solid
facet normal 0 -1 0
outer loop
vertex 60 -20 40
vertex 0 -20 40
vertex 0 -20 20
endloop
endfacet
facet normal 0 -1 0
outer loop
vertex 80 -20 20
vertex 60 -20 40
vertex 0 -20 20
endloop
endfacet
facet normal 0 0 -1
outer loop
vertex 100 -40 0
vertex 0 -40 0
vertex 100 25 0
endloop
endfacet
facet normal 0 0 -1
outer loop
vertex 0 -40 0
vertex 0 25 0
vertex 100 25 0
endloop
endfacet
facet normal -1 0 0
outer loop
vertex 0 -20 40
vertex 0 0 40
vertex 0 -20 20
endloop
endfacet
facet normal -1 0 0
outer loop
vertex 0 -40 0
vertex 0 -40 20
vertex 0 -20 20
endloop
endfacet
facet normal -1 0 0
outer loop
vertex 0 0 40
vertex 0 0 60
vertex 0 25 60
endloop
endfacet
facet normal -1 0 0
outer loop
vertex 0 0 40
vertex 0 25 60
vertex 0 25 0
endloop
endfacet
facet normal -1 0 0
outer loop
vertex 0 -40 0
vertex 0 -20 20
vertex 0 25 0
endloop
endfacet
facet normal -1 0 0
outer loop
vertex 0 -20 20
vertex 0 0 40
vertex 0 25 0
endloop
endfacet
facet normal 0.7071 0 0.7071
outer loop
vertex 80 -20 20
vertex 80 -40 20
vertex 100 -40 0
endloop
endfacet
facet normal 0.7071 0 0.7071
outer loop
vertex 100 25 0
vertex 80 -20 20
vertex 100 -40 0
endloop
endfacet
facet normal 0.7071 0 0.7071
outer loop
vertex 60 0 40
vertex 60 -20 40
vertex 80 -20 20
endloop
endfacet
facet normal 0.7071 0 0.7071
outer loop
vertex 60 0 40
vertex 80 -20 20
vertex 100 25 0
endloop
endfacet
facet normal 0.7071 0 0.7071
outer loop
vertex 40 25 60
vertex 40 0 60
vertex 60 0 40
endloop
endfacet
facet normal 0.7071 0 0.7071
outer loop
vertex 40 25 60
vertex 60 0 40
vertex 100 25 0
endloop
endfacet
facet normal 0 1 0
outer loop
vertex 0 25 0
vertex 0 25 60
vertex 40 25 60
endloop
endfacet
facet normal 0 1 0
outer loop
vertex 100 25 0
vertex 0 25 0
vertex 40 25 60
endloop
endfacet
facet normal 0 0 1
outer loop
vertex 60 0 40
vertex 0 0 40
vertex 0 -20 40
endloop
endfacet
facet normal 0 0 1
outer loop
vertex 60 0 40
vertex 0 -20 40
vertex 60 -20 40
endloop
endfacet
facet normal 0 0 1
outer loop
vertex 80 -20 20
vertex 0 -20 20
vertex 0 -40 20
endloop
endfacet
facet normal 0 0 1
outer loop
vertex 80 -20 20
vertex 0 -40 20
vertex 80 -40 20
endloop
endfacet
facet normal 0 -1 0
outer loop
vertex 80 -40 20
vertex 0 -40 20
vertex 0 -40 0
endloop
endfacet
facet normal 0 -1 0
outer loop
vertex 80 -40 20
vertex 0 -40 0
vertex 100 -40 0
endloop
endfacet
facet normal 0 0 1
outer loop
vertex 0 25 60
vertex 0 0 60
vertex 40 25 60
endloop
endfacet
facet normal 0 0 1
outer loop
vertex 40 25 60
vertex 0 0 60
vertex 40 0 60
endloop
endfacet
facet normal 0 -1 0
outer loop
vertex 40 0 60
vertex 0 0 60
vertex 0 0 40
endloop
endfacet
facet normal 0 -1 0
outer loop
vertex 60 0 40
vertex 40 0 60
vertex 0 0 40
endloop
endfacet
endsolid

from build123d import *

# Parameters (mm, degrees)
F0_W     = 100
F0_H     = 20
F1_DEPTH = 25
F2_DEPTH = 20
F3_DEPTH = 40
F4_SIZE  = 59.99999


# Not quite as in the source:
# - a fillet or chamfer is up to 0.001 mm smaller than in the source, because OpenCascade refuses the exact size


with BuildPart() as f1:
    # F0 (on Front) → F1 (new body)
    with BuildSketch(Plane.XZ):
        with Locations((50, 10)):
            Rectangle(F0_W, F0_H)
        with Locations((50, 30)):
            Rectangle(F0_W, F0_H)
        with Locations((50, 50)):
            Rectangle(F0_W, F0_H)
    extrude(amount=-F1_DEPTH)

    # F0 (on Front) → F2 (join)
    with BuildSketch(Plane.XZ):
        with Locations((50, 30)):
            Rectangle(F0_W, F0_H)
        with Locations((50, 10)):
            Rectangle(F0_W, F0_H)
    extrude(amount=F2_DEPTH)

    # F0 (on Front) → F3 (join)
    with BuildSketch(Plane.XZ):
        with Locations((50, 10)):
            Rectangle(F0_W, F0_H)
    extrude(amount=F3_DEPTH)

    # F4 (size 60 in the source; OpenCascade refuses exactly that, so slightly less here)
    f4_edges = [f1.edges().sort_by_distance(p)[0] for p in [
        (100, 12.5, 60),
    ]]
    chamfer(f4_edges, length=F4_SIZE)


solid = f1.part
